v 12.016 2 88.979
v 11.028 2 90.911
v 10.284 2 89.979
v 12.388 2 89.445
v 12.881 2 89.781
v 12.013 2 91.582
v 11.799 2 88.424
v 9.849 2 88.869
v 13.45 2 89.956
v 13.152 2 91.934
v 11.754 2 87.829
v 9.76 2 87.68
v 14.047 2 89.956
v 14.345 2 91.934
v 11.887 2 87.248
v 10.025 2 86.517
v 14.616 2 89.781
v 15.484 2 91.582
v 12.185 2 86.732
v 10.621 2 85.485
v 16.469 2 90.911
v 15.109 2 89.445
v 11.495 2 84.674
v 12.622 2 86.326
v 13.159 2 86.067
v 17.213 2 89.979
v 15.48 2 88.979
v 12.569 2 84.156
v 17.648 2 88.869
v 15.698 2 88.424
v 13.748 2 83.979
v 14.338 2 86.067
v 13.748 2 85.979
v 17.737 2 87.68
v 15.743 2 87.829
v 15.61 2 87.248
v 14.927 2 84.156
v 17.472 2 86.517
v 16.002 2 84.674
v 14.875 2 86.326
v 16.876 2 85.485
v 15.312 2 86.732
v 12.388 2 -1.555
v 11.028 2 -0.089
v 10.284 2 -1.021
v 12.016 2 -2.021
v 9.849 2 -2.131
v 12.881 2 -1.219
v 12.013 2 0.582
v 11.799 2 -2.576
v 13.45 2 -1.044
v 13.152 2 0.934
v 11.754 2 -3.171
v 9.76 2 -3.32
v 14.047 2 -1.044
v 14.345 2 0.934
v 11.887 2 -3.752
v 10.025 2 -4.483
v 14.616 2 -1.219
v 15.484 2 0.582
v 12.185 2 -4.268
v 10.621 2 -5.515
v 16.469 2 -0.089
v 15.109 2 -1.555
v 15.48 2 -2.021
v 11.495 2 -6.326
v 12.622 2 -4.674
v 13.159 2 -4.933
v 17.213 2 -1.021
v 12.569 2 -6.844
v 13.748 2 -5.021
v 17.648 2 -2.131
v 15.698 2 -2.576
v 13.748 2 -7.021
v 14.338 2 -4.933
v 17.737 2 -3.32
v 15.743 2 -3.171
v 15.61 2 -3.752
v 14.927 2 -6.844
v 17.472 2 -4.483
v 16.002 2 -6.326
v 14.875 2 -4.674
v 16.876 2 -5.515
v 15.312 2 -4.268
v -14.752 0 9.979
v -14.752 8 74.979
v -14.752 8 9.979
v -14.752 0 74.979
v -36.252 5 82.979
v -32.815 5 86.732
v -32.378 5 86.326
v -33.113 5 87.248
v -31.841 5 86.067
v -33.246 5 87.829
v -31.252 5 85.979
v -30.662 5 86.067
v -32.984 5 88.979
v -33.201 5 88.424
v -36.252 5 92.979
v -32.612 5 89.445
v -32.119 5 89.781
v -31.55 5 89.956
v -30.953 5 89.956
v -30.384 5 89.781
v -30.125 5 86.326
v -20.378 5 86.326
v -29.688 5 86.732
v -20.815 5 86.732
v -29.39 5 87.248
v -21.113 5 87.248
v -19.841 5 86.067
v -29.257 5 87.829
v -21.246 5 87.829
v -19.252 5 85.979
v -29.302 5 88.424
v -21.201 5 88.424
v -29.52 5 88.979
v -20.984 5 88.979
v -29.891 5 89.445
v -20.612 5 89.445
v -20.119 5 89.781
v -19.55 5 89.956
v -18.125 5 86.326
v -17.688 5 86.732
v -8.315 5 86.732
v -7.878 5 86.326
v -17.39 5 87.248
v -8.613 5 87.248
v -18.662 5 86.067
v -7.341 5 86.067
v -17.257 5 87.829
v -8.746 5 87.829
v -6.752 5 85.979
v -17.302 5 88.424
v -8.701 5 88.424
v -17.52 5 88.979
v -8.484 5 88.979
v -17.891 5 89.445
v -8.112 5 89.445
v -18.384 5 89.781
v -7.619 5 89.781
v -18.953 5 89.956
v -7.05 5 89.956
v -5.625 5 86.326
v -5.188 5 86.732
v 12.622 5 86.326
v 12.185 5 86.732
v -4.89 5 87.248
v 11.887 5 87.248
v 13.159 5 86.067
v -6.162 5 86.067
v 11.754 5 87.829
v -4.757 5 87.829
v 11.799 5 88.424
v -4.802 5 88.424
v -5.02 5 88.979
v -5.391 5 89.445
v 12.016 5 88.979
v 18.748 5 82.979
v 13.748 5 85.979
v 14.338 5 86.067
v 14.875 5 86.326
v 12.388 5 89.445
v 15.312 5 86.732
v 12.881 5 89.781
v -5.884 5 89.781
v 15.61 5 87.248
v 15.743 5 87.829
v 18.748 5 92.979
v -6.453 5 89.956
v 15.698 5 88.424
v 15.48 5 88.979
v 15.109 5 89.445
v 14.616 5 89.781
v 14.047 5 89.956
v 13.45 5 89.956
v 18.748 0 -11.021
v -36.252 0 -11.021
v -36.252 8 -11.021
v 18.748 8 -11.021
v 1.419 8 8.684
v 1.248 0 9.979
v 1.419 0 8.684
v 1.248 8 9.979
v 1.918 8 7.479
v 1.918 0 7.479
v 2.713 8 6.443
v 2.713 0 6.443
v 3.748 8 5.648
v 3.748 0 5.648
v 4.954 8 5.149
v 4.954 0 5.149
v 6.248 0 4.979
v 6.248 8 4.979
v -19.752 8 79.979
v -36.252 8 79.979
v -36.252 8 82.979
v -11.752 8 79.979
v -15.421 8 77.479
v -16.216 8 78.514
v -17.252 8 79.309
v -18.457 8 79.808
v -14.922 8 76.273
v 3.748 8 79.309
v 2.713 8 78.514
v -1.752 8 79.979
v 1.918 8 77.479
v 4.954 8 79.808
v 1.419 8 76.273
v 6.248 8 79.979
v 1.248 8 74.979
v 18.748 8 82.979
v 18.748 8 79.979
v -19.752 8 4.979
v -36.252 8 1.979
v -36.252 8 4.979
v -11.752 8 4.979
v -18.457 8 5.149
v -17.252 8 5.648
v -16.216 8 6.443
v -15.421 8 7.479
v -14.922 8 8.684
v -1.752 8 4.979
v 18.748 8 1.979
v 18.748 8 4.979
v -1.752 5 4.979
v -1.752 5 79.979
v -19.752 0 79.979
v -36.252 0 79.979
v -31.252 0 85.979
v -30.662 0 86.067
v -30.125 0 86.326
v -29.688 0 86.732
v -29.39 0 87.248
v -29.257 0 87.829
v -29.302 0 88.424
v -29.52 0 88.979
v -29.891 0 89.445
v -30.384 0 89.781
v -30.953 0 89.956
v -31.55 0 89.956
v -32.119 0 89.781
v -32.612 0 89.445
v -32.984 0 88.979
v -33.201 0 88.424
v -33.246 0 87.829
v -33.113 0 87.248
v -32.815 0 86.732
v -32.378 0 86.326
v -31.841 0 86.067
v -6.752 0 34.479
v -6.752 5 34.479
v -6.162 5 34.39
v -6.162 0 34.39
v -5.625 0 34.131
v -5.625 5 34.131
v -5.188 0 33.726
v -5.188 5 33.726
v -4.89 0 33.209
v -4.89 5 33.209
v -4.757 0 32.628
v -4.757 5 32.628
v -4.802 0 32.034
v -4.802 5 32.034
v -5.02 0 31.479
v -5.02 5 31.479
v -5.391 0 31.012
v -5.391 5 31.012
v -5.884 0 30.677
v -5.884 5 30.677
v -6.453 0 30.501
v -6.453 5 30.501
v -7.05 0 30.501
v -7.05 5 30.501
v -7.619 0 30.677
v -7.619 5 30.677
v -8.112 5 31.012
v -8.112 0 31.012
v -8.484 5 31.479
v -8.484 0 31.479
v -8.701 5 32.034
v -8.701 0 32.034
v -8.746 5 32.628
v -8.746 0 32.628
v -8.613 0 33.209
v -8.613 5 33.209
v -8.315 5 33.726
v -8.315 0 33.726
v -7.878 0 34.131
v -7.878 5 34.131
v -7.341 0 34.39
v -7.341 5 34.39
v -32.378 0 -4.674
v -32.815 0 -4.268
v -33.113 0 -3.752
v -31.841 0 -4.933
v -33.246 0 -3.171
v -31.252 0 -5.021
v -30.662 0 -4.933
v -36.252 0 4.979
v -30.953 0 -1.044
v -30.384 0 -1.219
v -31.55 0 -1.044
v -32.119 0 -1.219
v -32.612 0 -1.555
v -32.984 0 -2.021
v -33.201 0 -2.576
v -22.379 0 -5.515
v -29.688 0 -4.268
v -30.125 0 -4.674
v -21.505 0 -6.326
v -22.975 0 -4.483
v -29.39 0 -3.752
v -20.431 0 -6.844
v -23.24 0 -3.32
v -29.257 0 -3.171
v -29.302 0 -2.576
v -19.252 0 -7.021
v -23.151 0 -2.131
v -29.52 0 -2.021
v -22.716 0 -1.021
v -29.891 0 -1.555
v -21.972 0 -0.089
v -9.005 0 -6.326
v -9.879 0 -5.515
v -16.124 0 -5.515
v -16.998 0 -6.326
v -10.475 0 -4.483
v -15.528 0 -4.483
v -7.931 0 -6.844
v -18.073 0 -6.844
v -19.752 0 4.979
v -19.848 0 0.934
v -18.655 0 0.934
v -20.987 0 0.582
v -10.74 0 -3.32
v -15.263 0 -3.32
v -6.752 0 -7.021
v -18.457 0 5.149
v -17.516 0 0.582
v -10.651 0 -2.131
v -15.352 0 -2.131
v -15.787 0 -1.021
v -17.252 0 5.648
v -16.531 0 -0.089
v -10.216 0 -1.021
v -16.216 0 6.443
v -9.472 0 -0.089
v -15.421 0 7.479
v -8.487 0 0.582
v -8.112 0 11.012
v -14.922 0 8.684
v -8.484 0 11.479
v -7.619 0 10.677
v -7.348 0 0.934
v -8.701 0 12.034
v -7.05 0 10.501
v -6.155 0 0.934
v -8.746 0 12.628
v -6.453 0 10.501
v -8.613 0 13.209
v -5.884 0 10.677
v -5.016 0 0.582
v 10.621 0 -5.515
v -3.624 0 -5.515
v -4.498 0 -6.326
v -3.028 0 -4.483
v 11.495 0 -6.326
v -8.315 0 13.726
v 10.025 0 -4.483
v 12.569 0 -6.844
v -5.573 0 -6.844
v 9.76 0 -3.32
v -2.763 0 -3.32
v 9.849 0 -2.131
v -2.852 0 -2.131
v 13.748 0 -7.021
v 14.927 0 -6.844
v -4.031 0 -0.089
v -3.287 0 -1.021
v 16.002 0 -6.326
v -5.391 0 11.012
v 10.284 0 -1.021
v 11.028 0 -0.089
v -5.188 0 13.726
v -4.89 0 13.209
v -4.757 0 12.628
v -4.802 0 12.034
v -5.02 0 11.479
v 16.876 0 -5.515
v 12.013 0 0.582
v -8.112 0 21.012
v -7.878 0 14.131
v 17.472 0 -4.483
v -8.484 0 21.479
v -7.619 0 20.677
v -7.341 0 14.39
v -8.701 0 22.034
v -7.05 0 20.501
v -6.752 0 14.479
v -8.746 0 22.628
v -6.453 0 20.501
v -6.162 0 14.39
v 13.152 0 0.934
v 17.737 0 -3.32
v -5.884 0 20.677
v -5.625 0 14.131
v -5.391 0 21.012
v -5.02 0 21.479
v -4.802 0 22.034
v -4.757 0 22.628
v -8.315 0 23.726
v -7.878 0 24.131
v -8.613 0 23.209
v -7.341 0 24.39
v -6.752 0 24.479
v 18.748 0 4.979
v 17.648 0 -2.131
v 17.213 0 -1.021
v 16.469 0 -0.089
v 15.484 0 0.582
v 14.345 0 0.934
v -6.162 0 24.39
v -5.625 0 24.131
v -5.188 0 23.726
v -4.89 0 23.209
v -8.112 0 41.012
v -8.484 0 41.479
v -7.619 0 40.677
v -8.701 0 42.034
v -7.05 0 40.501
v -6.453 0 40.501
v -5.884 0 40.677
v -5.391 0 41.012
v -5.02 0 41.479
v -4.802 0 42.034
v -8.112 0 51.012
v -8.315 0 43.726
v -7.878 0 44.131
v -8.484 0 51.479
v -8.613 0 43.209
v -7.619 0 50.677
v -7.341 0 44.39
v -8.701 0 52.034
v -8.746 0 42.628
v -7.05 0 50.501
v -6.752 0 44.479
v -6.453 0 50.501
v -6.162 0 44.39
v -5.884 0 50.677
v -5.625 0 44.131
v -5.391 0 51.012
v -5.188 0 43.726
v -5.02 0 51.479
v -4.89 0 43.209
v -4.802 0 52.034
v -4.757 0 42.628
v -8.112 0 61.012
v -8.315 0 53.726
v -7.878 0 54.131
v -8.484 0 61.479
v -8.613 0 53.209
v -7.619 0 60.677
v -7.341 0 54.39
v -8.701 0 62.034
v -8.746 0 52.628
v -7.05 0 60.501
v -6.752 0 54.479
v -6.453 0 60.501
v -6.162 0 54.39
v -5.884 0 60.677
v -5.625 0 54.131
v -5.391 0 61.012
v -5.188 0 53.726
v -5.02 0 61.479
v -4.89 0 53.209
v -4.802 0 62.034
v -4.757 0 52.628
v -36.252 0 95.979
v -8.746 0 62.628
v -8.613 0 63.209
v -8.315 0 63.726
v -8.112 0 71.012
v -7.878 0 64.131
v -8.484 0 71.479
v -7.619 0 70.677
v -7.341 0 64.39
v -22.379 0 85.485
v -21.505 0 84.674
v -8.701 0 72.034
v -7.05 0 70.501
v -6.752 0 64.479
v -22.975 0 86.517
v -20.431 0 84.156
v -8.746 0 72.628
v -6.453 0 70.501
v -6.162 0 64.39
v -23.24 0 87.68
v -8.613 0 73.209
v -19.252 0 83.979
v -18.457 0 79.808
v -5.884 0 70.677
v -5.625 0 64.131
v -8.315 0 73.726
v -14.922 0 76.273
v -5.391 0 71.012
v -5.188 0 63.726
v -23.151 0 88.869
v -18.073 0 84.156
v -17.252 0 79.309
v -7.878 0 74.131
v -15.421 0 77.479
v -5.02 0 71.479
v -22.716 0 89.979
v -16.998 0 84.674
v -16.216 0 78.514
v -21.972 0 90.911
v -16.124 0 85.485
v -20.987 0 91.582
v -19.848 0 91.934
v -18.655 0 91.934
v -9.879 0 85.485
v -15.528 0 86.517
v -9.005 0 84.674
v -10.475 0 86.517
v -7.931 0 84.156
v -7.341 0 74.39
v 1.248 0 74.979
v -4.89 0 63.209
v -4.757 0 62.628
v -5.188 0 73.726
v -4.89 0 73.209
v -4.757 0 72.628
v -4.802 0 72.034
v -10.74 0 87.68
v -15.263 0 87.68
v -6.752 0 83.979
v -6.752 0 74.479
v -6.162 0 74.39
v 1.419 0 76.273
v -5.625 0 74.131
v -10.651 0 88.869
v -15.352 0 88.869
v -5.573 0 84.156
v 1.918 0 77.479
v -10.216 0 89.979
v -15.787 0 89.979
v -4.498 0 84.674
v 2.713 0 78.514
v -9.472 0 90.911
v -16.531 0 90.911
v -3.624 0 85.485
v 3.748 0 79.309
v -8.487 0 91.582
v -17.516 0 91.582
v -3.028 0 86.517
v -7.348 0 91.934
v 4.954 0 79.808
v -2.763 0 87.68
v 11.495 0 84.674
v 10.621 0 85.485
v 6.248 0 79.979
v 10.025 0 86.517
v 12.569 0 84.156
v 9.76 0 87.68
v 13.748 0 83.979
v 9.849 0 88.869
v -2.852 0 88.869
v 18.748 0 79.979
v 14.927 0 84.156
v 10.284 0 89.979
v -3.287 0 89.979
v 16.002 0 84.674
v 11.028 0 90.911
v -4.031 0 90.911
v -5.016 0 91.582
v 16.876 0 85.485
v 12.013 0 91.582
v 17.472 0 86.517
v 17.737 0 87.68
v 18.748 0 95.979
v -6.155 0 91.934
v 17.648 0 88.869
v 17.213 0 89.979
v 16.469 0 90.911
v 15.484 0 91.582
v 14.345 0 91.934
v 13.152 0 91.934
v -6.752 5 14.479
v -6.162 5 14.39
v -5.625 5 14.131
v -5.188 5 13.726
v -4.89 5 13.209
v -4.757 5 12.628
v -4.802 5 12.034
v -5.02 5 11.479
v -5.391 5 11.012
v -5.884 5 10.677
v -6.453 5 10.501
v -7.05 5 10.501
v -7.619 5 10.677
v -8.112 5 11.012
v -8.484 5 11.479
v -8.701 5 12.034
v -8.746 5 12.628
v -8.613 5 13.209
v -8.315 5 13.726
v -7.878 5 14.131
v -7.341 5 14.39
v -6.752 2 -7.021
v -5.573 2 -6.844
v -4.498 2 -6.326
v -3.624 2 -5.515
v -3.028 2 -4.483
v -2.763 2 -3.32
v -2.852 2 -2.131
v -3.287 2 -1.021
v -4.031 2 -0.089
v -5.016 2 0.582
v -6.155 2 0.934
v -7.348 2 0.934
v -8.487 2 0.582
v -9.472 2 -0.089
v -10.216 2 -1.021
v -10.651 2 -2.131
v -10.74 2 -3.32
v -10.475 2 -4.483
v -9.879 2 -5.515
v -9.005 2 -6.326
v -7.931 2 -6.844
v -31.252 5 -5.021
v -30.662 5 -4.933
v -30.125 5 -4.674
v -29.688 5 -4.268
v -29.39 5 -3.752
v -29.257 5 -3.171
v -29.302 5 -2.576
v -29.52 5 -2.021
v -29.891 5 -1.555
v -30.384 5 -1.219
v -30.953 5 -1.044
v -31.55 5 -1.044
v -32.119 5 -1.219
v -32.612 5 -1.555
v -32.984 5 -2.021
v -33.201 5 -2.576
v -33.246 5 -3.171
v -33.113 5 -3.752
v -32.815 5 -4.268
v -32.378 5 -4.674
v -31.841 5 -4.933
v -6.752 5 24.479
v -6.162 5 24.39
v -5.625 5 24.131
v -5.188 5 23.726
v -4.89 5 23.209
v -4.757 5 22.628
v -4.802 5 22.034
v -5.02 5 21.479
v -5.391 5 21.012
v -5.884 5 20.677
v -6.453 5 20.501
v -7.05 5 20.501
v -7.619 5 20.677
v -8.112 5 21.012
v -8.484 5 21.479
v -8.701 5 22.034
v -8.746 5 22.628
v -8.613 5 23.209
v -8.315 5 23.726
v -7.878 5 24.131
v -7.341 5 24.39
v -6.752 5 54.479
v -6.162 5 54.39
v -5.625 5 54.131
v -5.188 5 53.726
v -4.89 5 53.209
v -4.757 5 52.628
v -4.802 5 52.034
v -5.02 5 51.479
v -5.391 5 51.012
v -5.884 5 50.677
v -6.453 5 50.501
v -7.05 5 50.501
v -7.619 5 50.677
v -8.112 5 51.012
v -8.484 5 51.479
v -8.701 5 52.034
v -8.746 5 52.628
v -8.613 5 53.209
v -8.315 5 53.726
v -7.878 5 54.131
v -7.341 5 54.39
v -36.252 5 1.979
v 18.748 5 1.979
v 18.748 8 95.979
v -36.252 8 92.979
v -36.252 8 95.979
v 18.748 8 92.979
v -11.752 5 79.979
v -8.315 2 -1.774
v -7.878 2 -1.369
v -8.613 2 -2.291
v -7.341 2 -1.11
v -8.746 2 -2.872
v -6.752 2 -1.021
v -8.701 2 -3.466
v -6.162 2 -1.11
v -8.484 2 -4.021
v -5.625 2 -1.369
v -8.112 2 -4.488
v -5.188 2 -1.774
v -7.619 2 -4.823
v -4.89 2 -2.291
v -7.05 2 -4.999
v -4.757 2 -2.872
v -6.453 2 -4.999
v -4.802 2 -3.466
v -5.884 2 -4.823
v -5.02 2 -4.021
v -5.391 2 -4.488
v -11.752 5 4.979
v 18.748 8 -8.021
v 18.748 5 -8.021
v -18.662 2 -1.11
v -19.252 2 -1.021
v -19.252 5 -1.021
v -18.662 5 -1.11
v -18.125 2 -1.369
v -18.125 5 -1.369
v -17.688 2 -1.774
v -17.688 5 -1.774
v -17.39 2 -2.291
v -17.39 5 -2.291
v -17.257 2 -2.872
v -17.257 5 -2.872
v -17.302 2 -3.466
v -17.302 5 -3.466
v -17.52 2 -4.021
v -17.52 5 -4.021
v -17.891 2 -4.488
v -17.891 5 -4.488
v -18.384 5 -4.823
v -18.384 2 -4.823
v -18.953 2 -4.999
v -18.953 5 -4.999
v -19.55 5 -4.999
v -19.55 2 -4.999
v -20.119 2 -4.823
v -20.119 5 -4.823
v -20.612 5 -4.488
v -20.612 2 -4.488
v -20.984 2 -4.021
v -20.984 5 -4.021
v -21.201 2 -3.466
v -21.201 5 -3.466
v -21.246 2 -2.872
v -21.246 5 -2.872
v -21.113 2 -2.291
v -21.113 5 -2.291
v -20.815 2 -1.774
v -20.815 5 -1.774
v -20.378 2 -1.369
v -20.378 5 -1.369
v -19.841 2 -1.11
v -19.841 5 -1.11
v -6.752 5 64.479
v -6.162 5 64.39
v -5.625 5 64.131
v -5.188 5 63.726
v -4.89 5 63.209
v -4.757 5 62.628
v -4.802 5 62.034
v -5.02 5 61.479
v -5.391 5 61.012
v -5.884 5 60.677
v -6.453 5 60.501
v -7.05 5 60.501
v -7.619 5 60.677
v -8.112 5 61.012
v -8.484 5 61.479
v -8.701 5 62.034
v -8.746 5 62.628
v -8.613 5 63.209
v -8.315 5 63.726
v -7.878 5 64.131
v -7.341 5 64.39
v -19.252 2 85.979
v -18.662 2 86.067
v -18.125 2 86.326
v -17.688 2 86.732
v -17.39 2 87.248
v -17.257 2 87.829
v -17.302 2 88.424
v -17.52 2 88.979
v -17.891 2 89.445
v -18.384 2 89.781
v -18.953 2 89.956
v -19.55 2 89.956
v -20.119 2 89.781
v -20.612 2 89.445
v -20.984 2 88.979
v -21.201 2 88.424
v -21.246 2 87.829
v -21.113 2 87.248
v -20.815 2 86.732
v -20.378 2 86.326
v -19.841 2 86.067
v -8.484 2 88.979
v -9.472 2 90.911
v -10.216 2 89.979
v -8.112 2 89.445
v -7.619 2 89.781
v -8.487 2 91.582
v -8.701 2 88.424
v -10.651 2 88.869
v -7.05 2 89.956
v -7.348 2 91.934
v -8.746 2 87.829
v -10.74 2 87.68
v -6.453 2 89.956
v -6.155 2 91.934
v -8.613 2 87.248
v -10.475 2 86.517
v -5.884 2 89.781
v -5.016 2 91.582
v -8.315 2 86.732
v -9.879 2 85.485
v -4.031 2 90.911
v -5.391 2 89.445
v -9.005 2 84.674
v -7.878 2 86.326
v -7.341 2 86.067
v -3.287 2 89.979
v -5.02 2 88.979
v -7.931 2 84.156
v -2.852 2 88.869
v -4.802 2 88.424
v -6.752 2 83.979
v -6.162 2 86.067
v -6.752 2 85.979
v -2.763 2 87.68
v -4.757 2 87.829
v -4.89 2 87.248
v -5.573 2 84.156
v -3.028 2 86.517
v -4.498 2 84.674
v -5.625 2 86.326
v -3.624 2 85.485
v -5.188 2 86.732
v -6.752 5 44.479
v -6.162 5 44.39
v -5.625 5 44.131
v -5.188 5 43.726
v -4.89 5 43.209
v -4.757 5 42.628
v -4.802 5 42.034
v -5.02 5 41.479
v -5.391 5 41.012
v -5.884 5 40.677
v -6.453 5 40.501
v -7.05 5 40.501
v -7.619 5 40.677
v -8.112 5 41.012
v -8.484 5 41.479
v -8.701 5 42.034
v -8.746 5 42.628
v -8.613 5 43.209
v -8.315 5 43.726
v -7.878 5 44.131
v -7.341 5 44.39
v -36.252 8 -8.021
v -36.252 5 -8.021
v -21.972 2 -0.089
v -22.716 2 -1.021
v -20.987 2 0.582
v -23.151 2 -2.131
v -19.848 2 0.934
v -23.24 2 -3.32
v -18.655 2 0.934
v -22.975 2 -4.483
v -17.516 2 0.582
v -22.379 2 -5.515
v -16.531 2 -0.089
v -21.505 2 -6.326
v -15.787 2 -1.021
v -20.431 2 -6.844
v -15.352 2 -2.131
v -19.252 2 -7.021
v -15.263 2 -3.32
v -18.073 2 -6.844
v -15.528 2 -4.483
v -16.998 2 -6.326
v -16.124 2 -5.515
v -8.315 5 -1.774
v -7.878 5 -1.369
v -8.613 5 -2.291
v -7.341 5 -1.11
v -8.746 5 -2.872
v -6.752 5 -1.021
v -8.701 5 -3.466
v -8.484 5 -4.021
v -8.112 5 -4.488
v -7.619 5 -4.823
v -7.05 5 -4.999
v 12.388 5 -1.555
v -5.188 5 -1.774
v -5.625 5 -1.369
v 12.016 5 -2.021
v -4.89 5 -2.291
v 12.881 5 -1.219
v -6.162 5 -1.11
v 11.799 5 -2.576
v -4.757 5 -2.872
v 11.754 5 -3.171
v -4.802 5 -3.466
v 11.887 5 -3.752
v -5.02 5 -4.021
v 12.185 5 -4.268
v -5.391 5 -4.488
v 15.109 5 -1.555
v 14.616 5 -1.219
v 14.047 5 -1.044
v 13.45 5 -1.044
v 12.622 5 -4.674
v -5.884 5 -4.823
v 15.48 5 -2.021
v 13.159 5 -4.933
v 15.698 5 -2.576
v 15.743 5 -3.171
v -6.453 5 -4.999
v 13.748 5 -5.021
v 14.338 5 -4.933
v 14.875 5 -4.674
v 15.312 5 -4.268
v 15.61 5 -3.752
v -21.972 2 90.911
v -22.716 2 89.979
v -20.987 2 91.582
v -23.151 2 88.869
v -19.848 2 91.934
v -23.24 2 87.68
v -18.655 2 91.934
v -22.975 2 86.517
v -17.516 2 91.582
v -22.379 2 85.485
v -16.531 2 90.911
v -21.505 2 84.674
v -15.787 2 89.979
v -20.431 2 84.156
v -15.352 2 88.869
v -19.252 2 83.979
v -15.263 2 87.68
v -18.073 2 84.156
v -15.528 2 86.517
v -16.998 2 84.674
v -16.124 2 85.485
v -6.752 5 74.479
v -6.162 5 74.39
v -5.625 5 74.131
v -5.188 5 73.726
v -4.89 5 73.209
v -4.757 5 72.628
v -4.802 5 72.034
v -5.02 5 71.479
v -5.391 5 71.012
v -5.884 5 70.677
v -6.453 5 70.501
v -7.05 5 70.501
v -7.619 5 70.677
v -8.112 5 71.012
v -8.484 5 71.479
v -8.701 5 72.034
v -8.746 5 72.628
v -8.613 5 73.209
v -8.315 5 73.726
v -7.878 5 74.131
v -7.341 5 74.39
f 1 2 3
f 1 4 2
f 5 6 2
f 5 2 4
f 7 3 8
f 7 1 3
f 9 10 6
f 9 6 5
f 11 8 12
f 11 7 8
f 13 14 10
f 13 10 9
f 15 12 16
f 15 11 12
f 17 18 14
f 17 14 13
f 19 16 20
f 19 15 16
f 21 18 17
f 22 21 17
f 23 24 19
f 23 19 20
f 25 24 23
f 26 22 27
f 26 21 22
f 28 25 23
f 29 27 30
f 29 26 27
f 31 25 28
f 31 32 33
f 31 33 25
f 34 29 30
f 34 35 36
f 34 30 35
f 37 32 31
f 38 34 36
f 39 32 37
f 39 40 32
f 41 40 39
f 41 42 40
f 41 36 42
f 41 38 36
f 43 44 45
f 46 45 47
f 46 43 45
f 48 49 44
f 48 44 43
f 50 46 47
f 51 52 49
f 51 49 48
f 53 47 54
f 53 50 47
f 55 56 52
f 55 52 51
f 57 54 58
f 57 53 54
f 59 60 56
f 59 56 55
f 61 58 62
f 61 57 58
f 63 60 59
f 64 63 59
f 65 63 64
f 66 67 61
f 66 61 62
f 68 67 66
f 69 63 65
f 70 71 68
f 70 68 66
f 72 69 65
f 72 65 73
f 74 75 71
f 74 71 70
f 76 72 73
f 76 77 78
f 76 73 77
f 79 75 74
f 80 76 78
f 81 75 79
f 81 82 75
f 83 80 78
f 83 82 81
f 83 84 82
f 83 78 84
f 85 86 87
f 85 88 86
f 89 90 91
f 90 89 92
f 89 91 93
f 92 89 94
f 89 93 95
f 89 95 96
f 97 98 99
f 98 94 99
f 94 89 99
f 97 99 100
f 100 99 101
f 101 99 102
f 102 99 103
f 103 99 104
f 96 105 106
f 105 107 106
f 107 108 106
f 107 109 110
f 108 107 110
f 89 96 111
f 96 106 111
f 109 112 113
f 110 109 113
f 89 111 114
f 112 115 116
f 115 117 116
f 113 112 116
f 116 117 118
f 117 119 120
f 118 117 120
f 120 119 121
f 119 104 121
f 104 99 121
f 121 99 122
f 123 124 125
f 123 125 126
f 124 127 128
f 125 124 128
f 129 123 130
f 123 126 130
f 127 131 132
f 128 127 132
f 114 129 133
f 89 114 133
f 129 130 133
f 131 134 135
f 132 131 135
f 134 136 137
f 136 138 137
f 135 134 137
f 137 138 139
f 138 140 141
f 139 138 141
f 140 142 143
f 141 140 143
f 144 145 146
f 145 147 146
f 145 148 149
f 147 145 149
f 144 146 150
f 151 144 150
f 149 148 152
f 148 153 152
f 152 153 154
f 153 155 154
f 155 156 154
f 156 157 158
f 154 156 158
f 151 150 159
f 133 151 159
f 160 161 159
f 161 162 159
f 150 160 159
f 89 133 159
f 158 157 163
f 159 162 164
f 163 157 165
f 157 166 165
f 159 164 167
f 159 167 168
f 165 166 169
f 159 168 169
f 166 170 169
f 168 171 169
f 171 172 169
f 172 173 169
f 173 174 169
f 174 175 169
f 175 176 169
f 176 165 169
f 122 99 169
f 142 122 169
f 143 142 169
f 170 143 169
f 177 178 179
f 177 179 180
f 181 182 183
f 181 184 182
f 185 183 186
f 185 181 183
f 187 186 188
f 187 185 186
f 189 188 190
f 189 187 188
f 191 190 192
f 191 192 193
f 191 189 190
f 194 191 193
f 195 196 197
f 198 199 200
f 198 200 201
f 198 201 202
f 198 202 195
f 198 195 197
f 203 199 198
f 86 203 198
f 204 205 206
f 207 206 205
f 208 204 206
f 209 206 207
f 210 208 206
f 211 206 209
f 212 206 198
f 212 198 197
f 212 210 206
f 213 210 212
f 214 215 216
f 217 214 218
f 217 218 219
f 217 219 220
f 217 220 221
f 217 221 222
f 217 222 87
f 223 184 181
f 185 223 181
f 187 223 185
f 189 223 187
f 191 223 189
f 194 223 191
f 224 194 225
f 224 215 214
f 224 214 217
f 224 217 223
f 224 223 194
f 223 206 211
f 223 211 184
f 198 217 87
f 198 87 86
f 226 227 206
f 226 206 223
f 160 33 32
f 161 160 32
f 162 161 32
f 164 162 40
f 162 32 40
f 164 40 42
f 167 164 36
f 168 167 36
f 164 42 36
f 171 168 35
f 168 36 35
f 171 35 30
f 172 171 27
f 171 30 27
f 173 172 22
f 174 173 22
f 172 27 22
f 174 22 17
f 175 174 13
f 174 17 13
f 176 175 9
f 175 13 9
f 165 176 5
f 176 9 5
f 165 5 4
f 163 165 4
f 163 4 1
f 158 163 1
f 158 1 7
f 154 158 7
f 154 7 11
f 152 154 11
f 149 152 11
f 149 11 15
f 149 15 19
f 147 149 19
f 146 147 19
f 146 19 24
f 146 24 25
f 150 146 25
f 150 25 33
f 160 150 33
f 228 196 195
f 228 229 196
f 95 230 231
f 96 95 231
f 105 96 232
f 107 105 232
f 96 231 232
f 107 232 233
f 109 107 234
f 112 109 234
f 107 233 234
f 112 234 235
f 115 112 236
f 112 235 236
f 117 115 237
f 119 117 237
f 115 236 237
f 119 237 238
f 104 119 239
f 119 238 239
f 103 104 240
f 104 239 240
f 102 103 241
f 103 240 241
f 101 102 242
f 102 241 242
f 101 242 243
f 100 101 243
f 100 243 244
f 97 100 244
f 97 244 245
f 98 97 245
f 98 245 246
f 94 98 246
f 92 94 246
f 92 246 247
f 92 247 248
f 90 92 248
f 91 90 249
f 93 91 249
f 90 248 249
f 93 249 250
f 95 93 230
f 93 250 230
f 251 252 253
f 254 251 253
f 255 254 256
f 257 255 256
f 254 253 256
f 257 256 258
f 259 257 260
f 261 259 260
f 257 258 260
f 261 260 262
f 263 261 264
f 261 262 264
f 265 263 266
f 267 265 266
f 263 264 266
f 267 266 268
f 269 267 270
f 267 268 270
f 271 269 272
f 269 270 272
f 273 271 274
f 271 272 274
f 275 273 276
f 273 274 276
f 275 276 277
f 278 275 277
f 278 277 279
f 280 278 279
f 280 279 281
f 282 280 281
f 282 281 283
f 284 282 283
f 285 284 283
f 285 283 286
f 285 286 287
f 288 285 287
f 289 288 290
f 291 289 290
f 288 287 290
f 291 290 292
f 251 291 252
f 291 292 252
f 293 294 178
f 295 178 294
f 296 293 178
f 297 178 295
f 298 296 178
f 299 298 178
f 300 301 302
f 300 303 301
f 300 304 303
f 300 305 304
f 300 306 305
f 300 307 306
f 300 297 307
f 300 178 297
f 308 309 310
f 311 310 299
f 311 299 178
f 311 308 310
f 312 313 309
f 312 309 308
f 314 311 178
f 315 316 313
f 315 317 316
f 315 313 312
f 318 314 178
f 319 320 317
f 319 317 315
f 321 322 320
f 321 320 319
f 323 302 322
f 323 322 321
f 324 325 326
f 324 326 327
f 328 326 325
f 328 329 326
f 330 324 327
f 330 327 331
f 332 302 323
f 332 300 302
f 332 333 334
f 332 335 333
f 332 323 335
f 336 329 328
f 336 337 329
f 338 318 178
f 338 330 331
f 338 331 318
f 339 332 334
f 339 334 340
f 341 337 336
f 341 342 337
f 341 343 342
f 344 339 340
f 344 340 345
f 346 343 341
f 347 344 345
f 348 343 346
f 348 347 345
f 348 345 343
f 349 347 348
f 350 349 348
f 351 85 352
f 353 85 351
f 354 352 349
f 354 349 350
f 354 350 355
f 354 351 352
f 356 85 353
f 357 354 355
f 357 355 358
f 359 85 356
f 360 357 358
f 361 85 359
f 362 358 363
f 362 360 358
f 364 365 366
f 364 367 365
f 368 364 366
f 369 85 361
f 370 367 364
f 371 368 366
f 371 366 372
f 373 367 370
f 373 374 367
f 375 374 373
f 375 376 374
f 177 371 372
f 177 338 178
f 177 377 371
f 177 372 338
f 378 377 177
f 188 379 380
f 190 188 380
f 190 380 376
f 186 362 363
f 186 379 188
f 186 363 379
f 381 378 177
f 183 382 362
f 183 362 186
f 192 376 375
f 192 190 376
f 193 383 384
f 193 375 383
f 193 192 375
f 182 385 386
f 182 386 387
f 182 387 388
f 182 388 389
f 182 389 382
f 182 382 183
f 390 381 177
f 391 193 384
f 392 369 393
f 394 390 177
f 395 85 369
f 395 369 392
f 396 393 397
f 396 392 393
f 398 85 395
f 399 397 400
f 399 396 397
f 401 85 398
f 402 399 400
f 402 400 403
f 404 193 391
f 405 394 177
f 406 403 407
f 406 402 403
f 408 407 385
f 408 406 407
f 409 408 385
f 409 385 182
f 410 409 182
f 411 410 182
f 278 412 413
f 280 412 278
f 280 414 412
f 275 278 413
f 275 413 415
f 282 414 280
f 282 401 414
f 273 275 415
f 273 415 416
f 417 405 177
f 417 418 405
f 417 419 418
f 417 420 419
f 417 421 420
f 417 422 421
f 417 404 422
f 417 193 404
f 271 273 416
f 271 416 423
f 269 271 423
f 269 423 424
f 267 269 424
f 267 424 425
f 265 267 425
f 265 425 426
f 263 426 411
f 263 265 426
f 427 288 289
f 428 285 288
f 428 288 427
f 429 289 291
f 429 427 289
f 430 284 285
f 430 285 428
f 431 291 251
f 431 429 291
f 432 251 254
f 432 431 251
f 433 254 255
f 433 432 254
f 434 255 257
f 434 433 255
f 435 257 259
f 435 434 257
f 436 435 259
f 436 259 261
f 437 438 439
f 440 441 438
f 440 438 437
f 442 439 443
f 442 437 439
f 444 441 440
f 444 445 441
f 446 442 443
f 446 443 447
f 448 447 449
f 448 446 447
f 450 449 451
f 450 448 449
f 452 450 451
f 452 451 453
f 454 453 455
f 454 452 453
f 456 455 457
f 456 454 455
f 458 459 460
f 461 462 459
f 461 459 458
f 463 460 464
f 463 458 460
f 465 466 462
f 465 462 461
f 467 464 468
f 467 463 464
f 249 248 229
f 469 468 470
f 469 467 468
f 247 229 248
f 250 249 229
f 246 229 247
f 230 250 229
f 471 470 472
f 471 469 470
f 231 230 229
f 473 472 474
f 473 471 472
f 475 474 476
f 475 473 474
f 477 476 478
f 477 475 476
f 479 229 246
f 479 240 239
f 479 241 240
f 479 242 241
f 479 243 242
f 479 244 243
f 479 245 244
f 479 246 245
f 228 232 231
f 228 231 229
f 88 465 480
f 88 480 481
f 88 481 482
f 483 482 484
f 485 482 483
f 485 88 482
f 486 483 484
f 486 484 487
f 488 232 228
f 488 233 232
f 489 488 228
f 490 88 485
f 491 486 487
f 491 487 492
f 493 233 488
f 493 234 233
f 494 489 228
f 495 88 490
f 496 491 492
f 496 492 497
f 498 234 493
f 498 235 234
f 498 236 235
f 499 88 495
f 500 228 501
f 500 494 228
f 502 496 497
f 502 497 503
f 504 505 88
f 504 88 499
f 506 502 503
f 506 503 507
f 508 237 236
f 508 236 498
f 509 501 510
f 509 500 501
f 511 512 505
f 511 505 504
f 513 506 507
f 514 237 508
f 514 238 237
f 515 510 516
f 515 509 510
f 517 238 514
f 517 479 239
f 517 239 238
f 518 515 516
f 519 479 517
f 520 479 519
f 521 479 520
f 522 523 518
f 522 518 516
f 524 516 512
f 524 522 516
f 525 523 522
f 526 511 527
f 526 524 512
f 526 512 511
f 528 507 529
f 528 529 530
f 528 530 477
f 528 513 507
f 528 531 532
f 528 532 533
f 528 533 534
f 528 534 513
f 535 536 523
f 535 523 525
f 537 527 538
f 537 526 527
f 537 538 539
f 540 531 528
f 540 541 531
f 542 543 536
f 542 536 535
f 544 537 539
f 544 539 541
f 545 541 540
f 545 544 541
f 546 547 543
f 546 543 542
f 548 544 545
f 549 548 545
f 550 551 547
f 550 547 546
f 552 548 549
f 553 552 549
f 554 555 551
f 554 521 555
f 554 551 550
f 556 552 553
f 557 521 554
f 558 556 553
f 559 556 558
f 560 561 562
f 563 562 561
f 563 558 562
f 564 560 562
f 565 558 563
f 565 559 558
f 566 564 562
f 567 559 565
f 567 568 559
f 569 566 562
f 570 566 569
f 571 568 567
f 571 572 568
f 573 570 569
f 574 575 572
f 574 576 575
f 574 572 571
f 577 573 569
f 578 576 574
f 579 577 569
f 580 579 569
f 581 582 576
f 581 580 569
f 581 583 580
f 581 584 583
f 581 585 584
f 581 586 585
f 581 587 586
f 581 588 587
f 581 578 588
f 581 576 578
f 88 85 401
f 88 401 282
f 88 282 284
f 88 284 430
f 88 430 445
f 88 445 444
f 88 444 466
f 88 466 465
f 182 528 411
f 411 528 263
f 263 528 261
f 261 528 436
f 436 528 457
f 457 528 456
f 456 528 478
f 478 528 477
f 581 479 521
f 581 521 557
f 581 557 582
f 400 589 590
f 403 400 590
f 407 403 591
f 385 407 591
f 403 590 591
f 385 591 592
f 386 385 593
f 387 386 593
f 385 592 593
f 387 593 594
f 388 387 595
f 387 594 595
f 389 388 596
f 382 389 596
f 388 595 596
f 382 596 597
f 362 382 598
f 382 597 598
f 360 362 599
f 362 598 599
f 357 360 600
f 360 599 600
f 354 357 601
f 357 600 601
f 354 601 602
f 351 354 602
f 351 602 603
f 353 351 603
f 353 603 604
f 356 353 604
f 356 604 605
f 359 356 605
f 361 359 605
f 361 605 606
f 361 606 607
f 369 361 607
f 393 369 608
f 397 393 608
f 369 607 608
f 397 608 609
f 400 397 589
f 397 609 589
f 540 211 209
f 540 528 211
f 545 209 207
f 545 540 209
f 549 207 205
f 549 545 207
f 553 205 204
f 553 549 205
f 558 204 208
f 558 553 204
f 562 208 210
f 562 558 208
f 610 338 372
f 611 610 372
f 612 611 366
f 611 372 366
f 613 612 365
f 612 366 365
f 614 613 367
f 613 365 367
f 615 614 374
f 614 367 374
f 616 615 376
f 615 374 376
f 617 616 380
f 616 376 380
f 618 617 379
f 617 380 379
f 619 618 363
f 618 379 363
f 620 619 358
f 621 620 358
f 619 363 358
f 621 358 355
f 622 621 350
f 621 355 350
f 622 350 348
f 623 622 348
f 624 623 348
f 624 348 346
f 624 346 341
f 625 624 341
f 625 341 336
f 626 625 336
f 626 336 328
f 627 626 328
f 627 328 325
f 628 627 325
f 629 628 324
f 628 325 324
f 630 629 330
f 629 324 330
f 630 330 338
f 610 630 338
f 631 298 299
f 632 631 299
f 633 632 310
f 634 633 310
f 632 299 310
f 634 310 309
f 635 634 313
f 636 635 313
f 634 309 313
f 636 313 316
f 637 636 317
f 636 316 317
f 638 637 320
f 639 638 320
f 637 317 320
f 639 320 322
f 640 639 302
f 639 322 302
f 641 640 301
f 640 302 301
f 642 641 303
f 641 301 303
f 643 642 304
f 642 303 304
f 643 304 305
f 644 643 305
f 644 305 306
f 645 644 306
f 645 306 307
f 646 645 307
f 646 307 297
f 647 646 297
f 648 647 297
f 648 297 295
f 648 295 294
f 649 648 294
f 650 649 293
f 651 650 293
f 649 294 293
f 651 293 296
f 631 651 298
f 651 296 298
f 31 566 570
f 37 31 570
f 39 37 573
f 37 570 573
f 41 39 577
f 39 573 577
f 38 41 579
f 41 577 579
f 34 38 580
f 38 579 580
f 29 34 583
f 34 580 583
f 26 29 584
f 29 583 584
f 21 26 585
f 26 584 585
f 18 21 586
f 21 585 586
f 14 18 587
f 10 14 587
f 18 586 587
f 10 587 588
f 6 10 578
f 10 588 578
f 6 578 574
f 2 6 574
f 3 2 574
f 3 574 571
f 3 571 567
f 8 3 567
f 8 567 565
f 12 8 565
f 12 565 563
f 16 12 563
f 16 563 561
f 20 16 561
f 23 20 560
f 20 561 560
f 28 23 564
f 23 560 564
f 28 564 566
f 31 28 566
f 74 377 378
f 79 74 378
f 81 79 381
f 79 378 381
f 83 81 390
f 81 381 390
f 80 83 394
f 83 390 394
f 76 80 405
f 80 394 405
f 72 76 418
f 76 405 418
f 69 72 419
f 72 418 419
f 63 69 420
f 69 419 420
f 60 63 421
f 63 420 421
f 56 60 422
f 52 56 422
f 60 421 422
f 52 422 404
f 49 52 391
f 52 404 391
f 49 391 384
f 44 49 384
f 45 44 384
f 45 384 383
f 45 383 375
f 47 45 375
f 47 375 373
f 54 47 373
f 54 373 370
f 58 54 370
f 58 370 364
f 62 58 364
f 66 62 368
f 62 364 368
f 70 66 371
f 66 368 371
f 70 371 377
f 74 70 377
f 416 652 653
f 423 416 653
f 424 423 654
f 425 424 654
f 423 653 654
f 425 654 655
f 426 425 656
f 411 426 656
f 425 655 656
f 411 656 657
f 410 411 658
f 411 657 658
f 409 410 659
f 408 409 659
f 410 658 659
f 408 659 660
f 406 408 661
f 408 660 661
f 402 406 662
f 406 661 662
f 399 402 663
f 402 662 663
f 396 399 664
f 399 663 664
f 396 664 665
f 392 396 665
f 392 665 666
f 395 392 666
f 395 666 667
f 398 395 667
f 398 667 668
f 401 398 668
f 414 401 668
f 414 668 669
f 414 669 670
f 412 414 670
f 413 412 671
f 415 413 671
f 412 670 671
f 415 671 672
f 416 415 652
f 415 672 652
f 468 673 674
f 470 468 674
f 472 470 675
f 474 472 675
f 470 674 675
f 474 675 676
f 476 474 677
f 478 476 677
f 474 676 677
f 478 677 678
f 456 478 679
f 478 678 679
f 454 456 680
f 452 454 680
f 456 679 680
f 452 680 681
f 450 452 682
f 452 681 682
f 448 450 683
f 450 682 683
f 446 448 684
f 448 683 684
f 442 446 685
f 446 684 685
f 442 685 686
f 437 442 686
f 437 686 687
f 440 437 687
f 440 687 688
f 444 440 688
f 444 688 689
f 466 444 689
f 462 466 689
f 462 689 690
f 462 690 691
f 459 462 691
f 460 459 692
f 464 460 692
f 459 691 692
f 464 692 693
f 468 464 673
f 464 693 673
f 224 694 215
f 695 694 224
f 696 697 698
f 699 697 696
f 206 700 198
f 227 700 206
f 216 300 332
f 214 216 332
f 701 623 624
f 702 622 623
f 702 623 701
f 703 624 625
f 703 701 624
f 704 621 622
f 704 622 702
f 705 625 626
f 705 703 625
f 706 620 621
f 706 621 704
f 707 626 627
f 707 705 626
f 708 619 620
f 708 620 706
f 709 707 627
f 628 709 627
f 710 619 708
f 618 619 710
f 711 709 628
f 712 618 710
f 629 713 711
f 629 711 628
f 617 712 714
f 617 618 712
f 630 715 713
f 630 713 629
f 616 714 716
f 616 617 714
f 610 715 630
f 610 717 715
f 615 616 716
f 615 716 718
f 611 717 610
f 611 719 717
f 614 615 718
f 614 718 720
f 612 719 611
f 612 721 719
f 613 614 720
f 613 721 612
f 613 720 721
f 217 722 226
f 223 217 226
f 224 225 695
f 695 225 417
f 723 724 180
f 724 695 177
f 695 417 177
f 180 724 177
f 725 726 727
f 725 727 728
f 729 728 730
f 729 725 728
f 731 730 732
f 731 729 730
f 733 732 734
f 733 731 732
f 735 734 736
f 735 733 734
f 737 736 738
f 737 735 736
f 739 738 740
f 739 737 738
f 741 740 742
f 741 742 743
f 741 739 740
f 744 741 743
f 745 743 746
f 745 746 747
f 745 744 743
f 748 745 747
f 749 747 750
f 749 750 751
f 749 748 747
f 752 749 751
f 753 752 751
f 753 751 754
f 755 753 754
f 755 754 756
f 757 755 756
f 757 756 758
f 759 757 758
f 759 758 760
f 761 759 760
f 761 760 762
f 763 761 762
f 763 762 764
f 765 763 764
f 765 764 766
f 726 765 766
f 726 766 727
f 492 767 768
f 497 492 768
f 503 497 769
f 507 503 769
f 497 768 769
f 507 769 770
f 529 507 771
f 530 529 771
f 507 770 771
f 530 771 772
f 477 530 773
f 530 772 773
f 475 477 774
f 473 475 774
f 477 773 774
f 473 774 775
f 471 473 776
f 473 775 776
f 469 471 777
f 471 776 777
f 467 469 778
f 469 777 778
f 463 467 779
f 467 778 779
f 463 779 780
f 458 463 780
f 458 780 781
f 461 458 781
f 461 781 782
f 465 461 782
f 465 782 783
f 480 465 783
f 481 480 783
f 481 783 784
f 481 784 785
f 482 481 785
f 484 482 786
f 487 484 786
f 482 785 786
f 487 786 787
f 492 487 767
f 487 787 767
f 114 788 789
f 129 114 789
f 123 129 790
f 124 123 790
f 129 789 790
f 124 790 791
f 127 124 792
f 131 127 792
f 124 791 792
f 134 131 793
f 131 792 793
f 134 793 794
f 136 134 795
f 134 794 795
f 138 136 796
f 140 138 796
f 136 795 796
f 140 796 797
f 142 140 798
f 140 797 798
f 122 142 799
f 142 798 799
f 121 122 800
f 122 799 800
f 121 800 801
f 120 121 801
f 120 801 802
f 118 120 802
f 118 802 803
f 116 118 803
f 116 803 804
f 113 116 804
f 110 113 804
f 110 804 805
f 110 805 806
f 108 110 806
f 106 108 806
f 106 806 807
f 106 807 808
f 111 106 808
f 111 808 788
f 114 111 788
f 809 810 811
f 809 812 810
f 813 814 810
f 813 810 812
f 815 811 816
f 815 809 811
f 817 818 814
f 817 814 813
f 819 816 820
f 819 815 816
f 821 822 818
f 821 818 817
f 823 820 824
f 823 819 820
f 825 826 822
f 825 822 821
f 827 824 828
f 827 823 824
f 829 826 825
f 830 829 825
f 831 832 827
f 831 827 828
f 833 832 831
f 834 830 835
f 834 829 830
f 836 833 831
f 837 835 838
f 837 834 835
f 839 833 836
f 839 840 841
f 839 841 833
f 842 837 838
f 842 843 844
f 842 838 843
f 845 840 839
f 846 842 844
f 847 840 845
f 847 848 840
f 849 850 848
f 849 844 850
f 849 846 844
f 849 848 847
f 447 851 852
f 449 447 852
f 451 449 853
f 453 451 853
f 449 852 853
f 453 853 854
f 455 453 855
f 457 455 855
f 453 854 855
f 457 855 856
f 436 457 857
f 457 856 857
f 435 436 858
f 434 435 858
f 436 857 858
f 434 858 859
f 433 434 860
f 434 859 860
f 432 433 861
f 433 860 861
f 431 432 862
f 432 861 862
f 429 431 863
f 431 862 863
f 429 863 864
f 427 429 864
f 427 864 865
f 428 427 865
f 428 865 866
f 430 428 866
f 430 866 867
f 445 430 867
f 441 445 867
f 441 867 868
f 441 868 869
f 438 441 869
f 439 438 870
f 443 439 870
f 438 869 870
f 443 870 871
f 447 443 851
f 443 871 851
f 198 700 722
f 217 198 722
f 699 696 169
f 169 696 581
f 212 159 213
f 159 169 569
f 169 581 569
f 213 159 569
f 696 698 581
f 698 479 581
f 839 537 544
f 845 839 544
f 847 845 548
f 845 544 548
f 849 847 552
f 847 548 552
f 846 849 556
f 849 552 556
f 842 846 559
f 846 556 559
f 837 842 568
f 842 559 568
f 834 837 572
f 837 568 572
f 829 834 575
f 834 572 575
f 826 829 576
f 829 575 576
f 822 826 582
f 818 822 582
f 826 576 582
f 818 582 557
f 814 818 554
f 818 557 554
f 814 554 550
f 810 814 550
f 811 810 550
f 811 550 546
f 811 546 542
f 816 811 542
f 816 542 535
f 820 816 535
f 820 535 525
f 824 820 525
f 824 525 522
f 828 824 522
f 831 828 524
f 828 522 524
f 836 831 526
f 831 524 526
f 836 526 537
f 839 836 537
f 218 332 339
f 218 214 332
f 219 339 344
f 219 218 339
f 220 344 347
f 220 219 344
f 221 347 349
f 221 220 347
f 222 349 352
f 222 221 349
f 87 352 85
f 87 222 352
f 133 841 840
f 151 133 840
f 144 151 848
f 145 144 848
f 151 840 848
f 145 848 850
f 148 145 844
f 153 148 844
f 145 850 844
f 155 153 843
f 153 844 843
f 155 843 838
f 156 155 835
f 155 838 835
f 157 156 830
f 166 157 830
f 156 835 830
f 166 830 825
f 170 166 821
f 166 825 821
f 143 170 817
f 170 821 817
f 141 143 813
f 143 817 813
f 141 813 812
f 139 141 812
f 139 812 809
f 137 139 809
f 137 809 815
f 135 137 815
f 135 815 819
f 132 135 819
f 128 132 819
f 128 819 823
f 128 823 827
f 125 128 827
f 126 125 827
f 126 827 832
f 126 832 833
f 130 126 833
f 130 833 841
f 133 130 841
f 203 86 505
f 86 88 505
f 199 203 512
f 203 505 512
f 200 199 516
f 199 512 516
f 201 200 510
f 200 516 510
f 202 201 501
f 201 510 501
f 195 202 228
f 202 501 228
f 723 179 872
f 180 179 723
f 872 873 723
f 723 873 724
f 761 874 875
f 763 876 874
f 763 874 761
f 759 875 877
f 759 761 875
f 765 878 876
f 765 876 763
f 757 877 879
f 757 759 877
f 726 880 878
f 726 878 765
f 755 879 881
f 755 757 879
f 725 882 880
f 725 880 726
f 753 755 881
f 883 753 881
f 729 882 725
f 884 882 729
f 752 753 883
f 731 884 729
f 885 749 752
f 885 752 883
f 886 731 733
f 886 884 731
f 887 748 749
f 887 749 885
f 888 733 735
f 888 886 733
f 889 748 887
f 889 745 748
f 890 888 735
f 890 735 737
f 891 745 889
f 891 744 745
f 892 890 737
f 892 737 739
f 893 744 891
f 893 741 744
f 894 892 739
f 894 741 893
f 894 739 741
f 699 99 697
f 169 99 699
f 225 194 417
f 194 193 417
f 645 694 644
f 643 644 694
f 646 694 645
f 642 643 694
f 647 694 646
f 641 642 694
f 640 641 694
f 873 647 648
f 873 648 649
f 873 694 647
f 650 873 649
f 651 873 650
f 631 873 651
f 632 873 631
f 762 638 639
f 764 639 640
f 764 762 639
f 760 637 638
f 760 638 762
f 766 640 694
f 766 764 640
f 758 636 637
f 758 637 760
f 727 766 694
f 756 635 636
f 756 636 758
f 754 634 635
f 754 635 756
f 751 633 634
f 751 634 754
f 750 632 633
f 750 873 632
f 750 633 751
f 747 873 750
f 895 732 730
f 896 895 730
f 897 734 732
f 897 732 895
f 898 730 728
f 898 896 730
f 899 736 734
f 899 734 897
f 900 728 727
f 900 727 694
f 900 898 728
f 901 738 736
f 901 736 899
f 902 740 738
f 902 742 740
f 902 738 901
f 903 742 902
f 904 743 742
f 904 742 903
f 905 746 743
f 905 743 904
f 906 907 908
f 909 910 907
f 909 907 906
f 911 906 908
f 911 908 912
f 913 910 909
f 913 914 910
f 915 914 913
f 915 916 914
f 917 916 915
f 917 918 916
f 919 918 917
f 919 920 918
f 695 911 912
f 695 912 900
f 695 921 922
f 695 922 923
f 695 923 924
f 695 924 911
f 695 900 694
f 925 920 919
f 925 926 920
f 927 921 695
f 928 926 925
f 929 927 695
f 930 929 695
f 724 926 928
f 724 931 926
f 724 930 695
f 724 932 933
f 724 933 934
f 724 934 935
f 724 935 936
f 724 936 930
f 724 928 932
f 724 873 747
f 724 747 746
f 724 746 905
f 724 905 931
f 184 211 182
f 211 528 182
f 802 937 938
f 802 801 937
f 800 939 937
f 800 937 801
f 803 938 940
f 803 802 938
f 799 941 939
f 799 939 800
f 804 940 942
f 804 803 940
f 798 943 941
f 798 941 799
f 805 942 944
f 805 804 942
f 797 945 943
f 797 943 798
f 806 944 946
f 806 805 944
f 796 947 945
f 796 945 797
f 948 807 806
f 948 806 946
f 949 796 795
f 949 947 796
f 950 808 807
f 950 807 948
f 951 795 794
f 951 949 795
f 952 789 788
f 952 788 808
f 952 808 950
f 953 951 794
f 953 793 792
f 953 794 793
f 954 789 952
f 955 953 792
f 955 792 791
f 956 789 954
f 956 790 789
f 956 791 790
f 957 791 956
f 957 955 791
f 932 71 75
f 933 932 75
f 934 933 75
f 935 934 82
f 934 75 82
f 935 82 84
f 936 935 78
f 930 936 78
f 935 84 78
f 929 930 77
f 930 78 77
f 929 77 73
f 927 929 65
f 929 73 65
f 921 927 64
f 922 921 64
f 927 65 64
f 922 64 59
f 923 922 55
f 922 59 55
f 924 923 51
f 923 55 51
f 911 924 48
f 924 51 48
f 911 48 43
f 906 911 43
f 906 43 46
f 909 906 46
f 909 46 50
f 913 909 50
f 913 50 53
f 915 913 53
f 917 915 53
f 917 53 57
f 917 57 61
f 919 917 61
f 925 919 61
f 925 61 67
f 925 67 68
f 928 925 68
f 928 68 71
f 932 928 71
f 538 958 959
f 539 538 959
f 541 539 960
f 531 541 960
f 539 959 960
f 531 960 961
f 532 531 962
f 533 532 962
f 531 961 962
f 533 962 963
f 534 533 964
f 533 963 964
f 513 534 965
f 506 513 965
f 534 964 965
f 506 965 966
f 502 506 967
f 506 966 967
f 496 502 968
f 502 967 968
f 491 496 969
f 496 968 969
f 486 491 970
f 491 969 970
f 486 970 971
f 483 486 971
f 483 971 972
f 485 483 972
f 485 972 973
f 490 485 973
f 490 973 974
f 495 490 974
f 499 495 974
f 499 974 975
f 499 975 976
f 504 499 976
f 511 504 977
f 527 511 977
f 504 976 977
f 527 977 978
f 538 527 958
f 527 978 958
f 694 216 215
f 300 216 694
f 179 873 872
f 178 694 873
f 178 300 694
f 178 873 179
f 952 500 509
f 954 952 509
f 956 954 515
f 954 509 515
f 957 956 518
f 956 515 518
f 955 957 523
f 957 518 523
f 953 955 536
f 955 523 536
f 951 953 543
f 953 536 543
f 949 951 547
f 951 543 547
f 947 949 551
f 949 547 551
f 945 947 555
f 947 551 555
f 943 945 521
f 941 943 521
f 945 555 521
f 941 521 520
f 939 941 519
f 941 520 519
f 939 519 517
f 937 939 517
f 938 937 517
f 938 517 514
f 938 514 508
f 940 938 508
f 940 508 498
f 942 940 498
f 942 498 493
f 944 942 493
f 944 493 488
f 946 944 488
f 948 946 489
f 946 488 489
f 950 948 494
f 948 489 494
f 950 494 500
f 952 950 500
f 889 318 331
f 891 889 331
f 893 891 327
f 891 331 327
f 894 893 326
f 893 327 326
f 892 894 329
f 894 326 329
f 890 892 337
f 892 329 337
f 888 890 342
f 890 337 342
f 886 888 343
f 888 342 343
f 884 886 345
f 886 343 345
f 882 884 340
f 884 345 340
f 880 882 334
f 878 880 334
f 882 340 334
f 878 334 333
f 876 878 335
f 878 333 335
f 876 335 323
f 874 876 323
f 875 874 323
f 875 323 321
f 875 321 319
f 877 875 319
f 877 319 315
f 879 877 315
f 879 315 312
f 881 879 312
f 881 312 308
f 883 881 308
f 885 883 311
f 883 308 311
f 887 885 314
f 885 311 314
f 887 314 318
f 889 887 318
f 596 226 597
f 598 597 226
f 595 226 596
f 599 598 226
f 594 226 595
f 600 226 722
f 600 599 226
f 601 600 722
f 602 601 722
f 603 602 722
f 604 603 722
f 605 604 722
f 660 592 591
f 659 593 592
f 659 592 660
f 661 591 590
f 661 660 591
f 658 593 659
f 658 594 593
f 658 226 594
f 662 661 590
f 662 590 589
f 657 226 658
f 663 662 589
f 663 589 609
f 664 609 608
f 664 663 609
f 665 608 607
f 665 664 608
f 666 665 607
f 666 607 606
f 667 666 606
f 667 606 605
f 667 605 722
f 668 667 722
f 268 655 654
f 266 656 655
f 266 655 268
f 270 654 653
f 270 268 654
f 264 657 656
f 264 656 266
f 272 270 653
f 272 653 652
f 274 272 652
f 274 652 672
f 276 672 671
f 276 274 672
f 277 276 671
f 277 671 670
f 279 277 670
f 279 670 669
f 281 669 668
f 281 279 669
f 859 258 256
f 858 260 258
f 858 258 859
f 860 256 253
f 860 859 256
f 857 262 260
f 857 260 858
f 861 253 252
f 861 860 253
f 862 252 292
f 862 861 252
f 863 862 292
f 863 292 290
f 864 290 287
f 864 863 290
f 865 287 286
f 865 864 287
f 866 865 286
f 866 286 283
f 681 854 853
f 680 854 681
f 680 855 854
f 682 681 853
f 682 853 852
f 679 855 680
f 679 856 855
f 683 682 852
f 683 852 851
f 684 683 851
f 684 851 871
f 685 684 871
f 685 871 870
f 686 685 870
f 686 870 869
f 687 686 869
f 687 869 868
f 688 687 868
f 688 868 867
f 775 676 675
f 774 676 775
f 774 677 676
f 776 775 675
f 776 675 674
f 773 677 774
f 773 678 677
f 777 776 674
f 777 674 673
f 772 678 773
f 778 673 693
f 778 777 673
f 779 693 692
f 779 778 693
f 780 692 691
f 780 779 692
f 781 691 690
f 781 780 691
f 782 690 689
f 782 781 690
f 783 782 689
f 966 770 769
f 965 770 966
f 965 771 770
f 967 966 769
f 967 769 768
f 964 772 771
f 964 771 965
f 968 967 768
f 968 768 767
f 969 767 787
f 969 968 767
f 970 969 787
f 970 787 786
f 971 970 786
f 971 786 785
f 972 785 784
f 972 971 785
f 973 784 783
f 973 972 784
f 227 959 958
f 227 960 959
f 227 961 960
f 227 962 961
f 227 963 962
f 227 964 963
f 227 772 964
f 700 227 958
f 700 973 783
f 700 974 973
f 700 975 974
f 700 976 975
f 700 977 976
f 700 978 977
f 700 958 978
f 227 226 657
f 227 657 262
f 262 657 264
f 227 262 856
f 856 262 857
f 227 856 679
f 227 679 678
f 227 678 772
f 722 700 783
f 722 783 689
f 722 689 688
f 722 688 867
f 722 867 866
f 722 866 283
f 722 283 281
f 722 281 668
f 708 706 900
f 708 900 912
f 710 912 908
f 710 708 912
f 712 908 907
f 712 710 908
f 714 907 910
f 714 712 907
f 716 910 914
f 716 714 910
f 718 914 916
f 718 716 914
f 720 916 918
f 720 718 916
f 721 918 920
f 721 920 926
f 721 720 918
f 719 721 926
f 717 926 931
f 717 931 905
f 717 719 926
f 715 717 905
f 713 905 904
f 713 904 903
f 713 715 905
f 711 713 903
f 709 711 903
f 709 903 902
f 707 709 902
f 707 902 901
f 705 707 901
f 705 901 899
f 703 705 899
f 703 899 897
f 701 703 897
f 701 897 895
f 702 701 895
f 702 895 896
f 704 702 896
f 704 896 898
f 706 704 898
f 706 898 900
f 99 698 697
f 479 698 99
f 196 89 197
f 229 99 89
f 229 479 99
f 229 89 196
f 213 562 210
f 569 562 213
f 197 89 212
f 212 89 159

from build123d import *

# Parameters (mm, degrees)
SKETCH1_W           = 55
SKETCH1_H           = 16
SKETCH1_R           = 2
BOSS_EXTRUDE1_DEPTH = 5
SKETCH2_W           = 55
SKETCH2_H           = 3
BOSS_EXTRUDE2_DEPTH = 3
SKETCH4_W           = 55
SKETCH4_H           = 16
SKETCH4_R           = 2
BOSS_EXTRUDE3_DEPTH = 5
SKETCH5_W           = 55
SKETCH5_H           = 3
BOSS_EXTRUDE4_DEPTH = 3
BOSS_EXTRUDE5_DEPTH = 5
SKETCH7_W           = 3
SKETCH7_H           = 75
BOSS_EXTRUDE6_DEPTH = 3
SKETCH8_R           = 2
CUT_EXTRUDE2_DEPTH  = 5
SKETCH10_R          = 4
CUT_EXTRUDE3_DEPTH  = 2
SKETCH11_R          = 2
CUT_EXTRUDE4_DEPTH  = 5
SKETCH12_R          = 2
CUT_EXTRUDE5_DEPTH  = 5
FILLET1_R           = 5


with BuildPart() as part:
    # Sketch1 → Boss-Extrude1 (new body)
    with BuildSketch(Plane(origin=(0, 0, 0), x_dir=(1, 0, 0), z_dir=(0, 1, 0))):
        with Locations((-8.751560295, 3.021428571)):
            Rectangle(SKETCH1_W, SKETCH1_H)
        with Locations(Location((-6.751560295, 3.021428571, 0), (0, 0, 270))):
            Circle(SKETCH1_R, mode=Mode.SUBTRACT)
        with Locations(Location((-19.251560295, 3.021428571, 0), (0, 0, 270))):
            Circle(SKETCH1_R, mode=Mode.SUBTRACT)
    extrude(amount=BOSS_EXTRUDE1_DEPTH)

    # Sketch2 → Boss-Extrude2 (add)
    with BuildSketch(Plane(origin=(0, 5, 0), x_dir=(1, 0, 0), z_dir=(0, 1, 0))):
        with Locations((-8.751560295, 9.521428571)):
            Rectangle(SKETCH2_W, SKETCH2_H)
        with Locations((-8.751560295, -3.478571429)):
            Rectangle(SKETCH2_W, SKETCH2_H)
    extrude(amount=BOSS_EXTRUDE2_DEPTH)



with BuildPart() as body_2:
    # Sketch4 → Boss-Extrude3 (new body)
    with BuildSketch(Plane.XZ):
        with Locations((-8.751560295, 87.978571429)):
            Rectangle(SKETCH4_W, SKETCH4_H)
        with Locations(Location((-19.251560295, 87.978571429, 0), (0, 0, 270))):
            Circle(SKETCH4_R, mode=Mode.SUBTRACT)
        with Locations(Location((-6.751560295, 87.978571429, 0), (0, 0, 270))):
            Circle(SKETCH4_R, mode=Mode.SUBTRACT)
    extrude(amount=-BOSS_EXTRUDE3_DEPTH)

    # Sketch5 → Boss-Extrude4 (add)
    with BuildSketch(Plane(origin=(0, 5, 0), x_dir=(1, 0, 0), z_dir=(0, 1, 0))):
        with Locations((-8.751560295, -94.478571429)):
            Rectangle(SKETCH5_W, SKETCH5_H)
        with Locations((-8.751560295, -81.478571429)):
            Rectangle(SKETCH5_W, SKETCH5_H)
    extrude(amount=BOSS_EXTRUDE4_DEPTH)


with BuildPart() as part_1:
    add(part.part)

    add(body_2.part)  # Boss-Extrude5 merges body 2
    # Sketch6 → Boss-Extrude5 (add)
    with BuildSketch(Plane.XZ):
        Polygon((-6.751560295, 79.978571429), (1.248439705, 79.978571429), (1.248439705, 4.978571429), (-14.751560295, 4.978571429), (-14.751560295, 79.978571429), align=None)
    extrude(amount=-BOSS_EXTRUDE5_DEPTH)

    # Sketch7 → Boss-Extrude6 (add)
    with BuildSketch(Plane(origin=(0, 5, 0), x_dir=(1, 0, 0), z_dir=(0, 1, 0))):
        with Locations((-0.251560295, -42.478571429)):
            Rectangle(SKETCH7_W, SKETCH7_H)
        with Locations((-13.251560295, -42.478571429)):
            Rectangle(SKETCH7_W, SKETCH7_H)
    extrude(amount=BOSS_EXTRUDE6_DEPTH)

    # Sketch8 → Cut-Extrude2 (cut)
    with BuildSketch(Plane.XZ):
        with Locations(Location((13.748439705, -3.021428571, 0), (0, 0, 270))):
            Circle(SKETCH8_R)
        with Locations(Location((13.748439705, 87.978571429, 0), (0, 0, 270))):
            Circle(SKETCH8_R)
    extrude(amount=-CUT_EXTRUDE2_DEPTH, mode=Mode.SUBTRACT)

    # Sketch10 → Cut-Extrude3 (cut)
    with BuildSketch(Plane.XZ):
        with Locations(Location((-19.251560295, -3.021428571, 0), (0, 0, 270))):
            Circle(SKETCH10_R)
        with Locations(Location((-6.751560295, -3.021428571, 0), (0, 0, 270))):
            Circle(SKETCH10_R)
        with Locations(Location((13.748439705, -3.021428571, 0), (0, 0, 270))):
            Circle(SKETCH10_R)
        with Locations(Location((-19.251560295, 87.978571429, 0), (0, 0, 270))):
            Circle(SKETCH10_R)
        with Locations(Location((-6.751560295, 87.978571429, 0), (0, 0, 270))):
            Circle(SKETCH10_R)
        with Locations(Location((13.748439705, 87.978571429, 0), (0, 0, 270))):
            Circle(SKETCH10_R)
    extrude(amount=-CUT_EXTRUDE3_DEPTH, mode=Mode.SUBTRACT)

    # Sketch11 → Cut-Extrude4 (cut)
    with BuildSketch(Plane.XZ):
        with Locations(Location((-31.251560295, -3.021428571, 0), (0, 0, 270))):
            Circle(SKETCH11_R)
        with Locations(Location((-31.251560295, 87.978571429, 0), (0, 0, 270))):
            Circle(SKETCH11_R)
    extrude(amount=-CUT_EXTRUDE4_DEPTH, mode=Mode.SUBTRACT)

    # Sketch12 → Cut-Extrude5 (cut)
    with BuildSketch(Plane(origin=(0, 5, 0), x_dir=(1, 0, 0), z_dir=(0, 1, 0))):
        with Locations(Location((-6.751560295, -12.478571429, 0), (0, 0, 270))):
            Circle(SKETCH12_R)
        with Locations(Location((-6.751560295, -22.478571429, 0), (0, 0, 270))):
            Circle(SKETCH12_R)
        with Locations(Location((-6.751560295, -32.478571429, 0), (0, 0, 270))):
            Circle(SKETCH12_R)
        with Locations(Location((-6.751560295, -42.478571429, 0), (0, 0, 270))):
            Circle(SKETCH12_R)
        with Locations(Location((-6.751560295, -52.478571429, 0), (0, 0, 270))):
            Circle(SKETCH12_R)
        with Locations(Location((-6.751560295, -62.478571429, 0), (0, 0, 270))):
            Circle(SKETCH12_R)
        with Locations(Location((-6.751560295, -72.478571429, 0), (0, 0, 270))):
            Circle(SKETCH12_R)
    extrude(amount=-CUT_EXTRUDE5_DEPTH, mode=Mode.SUBTRACT)

    # Fillet1
    fillet1_edges = [part_1.edges().sort_by_distance(p)[0] for p in [
        (-14.751560295, 4, 79.978571429),
        (1.248439705, 4, 79.978571429),
        (1.248439705, 4, 4.978571429),
        (-14.751560295, 4, 4.978571429),
    ]]
    fillet(fillet1_edges, radius=FILLET1_R)


solid = part_1.part
